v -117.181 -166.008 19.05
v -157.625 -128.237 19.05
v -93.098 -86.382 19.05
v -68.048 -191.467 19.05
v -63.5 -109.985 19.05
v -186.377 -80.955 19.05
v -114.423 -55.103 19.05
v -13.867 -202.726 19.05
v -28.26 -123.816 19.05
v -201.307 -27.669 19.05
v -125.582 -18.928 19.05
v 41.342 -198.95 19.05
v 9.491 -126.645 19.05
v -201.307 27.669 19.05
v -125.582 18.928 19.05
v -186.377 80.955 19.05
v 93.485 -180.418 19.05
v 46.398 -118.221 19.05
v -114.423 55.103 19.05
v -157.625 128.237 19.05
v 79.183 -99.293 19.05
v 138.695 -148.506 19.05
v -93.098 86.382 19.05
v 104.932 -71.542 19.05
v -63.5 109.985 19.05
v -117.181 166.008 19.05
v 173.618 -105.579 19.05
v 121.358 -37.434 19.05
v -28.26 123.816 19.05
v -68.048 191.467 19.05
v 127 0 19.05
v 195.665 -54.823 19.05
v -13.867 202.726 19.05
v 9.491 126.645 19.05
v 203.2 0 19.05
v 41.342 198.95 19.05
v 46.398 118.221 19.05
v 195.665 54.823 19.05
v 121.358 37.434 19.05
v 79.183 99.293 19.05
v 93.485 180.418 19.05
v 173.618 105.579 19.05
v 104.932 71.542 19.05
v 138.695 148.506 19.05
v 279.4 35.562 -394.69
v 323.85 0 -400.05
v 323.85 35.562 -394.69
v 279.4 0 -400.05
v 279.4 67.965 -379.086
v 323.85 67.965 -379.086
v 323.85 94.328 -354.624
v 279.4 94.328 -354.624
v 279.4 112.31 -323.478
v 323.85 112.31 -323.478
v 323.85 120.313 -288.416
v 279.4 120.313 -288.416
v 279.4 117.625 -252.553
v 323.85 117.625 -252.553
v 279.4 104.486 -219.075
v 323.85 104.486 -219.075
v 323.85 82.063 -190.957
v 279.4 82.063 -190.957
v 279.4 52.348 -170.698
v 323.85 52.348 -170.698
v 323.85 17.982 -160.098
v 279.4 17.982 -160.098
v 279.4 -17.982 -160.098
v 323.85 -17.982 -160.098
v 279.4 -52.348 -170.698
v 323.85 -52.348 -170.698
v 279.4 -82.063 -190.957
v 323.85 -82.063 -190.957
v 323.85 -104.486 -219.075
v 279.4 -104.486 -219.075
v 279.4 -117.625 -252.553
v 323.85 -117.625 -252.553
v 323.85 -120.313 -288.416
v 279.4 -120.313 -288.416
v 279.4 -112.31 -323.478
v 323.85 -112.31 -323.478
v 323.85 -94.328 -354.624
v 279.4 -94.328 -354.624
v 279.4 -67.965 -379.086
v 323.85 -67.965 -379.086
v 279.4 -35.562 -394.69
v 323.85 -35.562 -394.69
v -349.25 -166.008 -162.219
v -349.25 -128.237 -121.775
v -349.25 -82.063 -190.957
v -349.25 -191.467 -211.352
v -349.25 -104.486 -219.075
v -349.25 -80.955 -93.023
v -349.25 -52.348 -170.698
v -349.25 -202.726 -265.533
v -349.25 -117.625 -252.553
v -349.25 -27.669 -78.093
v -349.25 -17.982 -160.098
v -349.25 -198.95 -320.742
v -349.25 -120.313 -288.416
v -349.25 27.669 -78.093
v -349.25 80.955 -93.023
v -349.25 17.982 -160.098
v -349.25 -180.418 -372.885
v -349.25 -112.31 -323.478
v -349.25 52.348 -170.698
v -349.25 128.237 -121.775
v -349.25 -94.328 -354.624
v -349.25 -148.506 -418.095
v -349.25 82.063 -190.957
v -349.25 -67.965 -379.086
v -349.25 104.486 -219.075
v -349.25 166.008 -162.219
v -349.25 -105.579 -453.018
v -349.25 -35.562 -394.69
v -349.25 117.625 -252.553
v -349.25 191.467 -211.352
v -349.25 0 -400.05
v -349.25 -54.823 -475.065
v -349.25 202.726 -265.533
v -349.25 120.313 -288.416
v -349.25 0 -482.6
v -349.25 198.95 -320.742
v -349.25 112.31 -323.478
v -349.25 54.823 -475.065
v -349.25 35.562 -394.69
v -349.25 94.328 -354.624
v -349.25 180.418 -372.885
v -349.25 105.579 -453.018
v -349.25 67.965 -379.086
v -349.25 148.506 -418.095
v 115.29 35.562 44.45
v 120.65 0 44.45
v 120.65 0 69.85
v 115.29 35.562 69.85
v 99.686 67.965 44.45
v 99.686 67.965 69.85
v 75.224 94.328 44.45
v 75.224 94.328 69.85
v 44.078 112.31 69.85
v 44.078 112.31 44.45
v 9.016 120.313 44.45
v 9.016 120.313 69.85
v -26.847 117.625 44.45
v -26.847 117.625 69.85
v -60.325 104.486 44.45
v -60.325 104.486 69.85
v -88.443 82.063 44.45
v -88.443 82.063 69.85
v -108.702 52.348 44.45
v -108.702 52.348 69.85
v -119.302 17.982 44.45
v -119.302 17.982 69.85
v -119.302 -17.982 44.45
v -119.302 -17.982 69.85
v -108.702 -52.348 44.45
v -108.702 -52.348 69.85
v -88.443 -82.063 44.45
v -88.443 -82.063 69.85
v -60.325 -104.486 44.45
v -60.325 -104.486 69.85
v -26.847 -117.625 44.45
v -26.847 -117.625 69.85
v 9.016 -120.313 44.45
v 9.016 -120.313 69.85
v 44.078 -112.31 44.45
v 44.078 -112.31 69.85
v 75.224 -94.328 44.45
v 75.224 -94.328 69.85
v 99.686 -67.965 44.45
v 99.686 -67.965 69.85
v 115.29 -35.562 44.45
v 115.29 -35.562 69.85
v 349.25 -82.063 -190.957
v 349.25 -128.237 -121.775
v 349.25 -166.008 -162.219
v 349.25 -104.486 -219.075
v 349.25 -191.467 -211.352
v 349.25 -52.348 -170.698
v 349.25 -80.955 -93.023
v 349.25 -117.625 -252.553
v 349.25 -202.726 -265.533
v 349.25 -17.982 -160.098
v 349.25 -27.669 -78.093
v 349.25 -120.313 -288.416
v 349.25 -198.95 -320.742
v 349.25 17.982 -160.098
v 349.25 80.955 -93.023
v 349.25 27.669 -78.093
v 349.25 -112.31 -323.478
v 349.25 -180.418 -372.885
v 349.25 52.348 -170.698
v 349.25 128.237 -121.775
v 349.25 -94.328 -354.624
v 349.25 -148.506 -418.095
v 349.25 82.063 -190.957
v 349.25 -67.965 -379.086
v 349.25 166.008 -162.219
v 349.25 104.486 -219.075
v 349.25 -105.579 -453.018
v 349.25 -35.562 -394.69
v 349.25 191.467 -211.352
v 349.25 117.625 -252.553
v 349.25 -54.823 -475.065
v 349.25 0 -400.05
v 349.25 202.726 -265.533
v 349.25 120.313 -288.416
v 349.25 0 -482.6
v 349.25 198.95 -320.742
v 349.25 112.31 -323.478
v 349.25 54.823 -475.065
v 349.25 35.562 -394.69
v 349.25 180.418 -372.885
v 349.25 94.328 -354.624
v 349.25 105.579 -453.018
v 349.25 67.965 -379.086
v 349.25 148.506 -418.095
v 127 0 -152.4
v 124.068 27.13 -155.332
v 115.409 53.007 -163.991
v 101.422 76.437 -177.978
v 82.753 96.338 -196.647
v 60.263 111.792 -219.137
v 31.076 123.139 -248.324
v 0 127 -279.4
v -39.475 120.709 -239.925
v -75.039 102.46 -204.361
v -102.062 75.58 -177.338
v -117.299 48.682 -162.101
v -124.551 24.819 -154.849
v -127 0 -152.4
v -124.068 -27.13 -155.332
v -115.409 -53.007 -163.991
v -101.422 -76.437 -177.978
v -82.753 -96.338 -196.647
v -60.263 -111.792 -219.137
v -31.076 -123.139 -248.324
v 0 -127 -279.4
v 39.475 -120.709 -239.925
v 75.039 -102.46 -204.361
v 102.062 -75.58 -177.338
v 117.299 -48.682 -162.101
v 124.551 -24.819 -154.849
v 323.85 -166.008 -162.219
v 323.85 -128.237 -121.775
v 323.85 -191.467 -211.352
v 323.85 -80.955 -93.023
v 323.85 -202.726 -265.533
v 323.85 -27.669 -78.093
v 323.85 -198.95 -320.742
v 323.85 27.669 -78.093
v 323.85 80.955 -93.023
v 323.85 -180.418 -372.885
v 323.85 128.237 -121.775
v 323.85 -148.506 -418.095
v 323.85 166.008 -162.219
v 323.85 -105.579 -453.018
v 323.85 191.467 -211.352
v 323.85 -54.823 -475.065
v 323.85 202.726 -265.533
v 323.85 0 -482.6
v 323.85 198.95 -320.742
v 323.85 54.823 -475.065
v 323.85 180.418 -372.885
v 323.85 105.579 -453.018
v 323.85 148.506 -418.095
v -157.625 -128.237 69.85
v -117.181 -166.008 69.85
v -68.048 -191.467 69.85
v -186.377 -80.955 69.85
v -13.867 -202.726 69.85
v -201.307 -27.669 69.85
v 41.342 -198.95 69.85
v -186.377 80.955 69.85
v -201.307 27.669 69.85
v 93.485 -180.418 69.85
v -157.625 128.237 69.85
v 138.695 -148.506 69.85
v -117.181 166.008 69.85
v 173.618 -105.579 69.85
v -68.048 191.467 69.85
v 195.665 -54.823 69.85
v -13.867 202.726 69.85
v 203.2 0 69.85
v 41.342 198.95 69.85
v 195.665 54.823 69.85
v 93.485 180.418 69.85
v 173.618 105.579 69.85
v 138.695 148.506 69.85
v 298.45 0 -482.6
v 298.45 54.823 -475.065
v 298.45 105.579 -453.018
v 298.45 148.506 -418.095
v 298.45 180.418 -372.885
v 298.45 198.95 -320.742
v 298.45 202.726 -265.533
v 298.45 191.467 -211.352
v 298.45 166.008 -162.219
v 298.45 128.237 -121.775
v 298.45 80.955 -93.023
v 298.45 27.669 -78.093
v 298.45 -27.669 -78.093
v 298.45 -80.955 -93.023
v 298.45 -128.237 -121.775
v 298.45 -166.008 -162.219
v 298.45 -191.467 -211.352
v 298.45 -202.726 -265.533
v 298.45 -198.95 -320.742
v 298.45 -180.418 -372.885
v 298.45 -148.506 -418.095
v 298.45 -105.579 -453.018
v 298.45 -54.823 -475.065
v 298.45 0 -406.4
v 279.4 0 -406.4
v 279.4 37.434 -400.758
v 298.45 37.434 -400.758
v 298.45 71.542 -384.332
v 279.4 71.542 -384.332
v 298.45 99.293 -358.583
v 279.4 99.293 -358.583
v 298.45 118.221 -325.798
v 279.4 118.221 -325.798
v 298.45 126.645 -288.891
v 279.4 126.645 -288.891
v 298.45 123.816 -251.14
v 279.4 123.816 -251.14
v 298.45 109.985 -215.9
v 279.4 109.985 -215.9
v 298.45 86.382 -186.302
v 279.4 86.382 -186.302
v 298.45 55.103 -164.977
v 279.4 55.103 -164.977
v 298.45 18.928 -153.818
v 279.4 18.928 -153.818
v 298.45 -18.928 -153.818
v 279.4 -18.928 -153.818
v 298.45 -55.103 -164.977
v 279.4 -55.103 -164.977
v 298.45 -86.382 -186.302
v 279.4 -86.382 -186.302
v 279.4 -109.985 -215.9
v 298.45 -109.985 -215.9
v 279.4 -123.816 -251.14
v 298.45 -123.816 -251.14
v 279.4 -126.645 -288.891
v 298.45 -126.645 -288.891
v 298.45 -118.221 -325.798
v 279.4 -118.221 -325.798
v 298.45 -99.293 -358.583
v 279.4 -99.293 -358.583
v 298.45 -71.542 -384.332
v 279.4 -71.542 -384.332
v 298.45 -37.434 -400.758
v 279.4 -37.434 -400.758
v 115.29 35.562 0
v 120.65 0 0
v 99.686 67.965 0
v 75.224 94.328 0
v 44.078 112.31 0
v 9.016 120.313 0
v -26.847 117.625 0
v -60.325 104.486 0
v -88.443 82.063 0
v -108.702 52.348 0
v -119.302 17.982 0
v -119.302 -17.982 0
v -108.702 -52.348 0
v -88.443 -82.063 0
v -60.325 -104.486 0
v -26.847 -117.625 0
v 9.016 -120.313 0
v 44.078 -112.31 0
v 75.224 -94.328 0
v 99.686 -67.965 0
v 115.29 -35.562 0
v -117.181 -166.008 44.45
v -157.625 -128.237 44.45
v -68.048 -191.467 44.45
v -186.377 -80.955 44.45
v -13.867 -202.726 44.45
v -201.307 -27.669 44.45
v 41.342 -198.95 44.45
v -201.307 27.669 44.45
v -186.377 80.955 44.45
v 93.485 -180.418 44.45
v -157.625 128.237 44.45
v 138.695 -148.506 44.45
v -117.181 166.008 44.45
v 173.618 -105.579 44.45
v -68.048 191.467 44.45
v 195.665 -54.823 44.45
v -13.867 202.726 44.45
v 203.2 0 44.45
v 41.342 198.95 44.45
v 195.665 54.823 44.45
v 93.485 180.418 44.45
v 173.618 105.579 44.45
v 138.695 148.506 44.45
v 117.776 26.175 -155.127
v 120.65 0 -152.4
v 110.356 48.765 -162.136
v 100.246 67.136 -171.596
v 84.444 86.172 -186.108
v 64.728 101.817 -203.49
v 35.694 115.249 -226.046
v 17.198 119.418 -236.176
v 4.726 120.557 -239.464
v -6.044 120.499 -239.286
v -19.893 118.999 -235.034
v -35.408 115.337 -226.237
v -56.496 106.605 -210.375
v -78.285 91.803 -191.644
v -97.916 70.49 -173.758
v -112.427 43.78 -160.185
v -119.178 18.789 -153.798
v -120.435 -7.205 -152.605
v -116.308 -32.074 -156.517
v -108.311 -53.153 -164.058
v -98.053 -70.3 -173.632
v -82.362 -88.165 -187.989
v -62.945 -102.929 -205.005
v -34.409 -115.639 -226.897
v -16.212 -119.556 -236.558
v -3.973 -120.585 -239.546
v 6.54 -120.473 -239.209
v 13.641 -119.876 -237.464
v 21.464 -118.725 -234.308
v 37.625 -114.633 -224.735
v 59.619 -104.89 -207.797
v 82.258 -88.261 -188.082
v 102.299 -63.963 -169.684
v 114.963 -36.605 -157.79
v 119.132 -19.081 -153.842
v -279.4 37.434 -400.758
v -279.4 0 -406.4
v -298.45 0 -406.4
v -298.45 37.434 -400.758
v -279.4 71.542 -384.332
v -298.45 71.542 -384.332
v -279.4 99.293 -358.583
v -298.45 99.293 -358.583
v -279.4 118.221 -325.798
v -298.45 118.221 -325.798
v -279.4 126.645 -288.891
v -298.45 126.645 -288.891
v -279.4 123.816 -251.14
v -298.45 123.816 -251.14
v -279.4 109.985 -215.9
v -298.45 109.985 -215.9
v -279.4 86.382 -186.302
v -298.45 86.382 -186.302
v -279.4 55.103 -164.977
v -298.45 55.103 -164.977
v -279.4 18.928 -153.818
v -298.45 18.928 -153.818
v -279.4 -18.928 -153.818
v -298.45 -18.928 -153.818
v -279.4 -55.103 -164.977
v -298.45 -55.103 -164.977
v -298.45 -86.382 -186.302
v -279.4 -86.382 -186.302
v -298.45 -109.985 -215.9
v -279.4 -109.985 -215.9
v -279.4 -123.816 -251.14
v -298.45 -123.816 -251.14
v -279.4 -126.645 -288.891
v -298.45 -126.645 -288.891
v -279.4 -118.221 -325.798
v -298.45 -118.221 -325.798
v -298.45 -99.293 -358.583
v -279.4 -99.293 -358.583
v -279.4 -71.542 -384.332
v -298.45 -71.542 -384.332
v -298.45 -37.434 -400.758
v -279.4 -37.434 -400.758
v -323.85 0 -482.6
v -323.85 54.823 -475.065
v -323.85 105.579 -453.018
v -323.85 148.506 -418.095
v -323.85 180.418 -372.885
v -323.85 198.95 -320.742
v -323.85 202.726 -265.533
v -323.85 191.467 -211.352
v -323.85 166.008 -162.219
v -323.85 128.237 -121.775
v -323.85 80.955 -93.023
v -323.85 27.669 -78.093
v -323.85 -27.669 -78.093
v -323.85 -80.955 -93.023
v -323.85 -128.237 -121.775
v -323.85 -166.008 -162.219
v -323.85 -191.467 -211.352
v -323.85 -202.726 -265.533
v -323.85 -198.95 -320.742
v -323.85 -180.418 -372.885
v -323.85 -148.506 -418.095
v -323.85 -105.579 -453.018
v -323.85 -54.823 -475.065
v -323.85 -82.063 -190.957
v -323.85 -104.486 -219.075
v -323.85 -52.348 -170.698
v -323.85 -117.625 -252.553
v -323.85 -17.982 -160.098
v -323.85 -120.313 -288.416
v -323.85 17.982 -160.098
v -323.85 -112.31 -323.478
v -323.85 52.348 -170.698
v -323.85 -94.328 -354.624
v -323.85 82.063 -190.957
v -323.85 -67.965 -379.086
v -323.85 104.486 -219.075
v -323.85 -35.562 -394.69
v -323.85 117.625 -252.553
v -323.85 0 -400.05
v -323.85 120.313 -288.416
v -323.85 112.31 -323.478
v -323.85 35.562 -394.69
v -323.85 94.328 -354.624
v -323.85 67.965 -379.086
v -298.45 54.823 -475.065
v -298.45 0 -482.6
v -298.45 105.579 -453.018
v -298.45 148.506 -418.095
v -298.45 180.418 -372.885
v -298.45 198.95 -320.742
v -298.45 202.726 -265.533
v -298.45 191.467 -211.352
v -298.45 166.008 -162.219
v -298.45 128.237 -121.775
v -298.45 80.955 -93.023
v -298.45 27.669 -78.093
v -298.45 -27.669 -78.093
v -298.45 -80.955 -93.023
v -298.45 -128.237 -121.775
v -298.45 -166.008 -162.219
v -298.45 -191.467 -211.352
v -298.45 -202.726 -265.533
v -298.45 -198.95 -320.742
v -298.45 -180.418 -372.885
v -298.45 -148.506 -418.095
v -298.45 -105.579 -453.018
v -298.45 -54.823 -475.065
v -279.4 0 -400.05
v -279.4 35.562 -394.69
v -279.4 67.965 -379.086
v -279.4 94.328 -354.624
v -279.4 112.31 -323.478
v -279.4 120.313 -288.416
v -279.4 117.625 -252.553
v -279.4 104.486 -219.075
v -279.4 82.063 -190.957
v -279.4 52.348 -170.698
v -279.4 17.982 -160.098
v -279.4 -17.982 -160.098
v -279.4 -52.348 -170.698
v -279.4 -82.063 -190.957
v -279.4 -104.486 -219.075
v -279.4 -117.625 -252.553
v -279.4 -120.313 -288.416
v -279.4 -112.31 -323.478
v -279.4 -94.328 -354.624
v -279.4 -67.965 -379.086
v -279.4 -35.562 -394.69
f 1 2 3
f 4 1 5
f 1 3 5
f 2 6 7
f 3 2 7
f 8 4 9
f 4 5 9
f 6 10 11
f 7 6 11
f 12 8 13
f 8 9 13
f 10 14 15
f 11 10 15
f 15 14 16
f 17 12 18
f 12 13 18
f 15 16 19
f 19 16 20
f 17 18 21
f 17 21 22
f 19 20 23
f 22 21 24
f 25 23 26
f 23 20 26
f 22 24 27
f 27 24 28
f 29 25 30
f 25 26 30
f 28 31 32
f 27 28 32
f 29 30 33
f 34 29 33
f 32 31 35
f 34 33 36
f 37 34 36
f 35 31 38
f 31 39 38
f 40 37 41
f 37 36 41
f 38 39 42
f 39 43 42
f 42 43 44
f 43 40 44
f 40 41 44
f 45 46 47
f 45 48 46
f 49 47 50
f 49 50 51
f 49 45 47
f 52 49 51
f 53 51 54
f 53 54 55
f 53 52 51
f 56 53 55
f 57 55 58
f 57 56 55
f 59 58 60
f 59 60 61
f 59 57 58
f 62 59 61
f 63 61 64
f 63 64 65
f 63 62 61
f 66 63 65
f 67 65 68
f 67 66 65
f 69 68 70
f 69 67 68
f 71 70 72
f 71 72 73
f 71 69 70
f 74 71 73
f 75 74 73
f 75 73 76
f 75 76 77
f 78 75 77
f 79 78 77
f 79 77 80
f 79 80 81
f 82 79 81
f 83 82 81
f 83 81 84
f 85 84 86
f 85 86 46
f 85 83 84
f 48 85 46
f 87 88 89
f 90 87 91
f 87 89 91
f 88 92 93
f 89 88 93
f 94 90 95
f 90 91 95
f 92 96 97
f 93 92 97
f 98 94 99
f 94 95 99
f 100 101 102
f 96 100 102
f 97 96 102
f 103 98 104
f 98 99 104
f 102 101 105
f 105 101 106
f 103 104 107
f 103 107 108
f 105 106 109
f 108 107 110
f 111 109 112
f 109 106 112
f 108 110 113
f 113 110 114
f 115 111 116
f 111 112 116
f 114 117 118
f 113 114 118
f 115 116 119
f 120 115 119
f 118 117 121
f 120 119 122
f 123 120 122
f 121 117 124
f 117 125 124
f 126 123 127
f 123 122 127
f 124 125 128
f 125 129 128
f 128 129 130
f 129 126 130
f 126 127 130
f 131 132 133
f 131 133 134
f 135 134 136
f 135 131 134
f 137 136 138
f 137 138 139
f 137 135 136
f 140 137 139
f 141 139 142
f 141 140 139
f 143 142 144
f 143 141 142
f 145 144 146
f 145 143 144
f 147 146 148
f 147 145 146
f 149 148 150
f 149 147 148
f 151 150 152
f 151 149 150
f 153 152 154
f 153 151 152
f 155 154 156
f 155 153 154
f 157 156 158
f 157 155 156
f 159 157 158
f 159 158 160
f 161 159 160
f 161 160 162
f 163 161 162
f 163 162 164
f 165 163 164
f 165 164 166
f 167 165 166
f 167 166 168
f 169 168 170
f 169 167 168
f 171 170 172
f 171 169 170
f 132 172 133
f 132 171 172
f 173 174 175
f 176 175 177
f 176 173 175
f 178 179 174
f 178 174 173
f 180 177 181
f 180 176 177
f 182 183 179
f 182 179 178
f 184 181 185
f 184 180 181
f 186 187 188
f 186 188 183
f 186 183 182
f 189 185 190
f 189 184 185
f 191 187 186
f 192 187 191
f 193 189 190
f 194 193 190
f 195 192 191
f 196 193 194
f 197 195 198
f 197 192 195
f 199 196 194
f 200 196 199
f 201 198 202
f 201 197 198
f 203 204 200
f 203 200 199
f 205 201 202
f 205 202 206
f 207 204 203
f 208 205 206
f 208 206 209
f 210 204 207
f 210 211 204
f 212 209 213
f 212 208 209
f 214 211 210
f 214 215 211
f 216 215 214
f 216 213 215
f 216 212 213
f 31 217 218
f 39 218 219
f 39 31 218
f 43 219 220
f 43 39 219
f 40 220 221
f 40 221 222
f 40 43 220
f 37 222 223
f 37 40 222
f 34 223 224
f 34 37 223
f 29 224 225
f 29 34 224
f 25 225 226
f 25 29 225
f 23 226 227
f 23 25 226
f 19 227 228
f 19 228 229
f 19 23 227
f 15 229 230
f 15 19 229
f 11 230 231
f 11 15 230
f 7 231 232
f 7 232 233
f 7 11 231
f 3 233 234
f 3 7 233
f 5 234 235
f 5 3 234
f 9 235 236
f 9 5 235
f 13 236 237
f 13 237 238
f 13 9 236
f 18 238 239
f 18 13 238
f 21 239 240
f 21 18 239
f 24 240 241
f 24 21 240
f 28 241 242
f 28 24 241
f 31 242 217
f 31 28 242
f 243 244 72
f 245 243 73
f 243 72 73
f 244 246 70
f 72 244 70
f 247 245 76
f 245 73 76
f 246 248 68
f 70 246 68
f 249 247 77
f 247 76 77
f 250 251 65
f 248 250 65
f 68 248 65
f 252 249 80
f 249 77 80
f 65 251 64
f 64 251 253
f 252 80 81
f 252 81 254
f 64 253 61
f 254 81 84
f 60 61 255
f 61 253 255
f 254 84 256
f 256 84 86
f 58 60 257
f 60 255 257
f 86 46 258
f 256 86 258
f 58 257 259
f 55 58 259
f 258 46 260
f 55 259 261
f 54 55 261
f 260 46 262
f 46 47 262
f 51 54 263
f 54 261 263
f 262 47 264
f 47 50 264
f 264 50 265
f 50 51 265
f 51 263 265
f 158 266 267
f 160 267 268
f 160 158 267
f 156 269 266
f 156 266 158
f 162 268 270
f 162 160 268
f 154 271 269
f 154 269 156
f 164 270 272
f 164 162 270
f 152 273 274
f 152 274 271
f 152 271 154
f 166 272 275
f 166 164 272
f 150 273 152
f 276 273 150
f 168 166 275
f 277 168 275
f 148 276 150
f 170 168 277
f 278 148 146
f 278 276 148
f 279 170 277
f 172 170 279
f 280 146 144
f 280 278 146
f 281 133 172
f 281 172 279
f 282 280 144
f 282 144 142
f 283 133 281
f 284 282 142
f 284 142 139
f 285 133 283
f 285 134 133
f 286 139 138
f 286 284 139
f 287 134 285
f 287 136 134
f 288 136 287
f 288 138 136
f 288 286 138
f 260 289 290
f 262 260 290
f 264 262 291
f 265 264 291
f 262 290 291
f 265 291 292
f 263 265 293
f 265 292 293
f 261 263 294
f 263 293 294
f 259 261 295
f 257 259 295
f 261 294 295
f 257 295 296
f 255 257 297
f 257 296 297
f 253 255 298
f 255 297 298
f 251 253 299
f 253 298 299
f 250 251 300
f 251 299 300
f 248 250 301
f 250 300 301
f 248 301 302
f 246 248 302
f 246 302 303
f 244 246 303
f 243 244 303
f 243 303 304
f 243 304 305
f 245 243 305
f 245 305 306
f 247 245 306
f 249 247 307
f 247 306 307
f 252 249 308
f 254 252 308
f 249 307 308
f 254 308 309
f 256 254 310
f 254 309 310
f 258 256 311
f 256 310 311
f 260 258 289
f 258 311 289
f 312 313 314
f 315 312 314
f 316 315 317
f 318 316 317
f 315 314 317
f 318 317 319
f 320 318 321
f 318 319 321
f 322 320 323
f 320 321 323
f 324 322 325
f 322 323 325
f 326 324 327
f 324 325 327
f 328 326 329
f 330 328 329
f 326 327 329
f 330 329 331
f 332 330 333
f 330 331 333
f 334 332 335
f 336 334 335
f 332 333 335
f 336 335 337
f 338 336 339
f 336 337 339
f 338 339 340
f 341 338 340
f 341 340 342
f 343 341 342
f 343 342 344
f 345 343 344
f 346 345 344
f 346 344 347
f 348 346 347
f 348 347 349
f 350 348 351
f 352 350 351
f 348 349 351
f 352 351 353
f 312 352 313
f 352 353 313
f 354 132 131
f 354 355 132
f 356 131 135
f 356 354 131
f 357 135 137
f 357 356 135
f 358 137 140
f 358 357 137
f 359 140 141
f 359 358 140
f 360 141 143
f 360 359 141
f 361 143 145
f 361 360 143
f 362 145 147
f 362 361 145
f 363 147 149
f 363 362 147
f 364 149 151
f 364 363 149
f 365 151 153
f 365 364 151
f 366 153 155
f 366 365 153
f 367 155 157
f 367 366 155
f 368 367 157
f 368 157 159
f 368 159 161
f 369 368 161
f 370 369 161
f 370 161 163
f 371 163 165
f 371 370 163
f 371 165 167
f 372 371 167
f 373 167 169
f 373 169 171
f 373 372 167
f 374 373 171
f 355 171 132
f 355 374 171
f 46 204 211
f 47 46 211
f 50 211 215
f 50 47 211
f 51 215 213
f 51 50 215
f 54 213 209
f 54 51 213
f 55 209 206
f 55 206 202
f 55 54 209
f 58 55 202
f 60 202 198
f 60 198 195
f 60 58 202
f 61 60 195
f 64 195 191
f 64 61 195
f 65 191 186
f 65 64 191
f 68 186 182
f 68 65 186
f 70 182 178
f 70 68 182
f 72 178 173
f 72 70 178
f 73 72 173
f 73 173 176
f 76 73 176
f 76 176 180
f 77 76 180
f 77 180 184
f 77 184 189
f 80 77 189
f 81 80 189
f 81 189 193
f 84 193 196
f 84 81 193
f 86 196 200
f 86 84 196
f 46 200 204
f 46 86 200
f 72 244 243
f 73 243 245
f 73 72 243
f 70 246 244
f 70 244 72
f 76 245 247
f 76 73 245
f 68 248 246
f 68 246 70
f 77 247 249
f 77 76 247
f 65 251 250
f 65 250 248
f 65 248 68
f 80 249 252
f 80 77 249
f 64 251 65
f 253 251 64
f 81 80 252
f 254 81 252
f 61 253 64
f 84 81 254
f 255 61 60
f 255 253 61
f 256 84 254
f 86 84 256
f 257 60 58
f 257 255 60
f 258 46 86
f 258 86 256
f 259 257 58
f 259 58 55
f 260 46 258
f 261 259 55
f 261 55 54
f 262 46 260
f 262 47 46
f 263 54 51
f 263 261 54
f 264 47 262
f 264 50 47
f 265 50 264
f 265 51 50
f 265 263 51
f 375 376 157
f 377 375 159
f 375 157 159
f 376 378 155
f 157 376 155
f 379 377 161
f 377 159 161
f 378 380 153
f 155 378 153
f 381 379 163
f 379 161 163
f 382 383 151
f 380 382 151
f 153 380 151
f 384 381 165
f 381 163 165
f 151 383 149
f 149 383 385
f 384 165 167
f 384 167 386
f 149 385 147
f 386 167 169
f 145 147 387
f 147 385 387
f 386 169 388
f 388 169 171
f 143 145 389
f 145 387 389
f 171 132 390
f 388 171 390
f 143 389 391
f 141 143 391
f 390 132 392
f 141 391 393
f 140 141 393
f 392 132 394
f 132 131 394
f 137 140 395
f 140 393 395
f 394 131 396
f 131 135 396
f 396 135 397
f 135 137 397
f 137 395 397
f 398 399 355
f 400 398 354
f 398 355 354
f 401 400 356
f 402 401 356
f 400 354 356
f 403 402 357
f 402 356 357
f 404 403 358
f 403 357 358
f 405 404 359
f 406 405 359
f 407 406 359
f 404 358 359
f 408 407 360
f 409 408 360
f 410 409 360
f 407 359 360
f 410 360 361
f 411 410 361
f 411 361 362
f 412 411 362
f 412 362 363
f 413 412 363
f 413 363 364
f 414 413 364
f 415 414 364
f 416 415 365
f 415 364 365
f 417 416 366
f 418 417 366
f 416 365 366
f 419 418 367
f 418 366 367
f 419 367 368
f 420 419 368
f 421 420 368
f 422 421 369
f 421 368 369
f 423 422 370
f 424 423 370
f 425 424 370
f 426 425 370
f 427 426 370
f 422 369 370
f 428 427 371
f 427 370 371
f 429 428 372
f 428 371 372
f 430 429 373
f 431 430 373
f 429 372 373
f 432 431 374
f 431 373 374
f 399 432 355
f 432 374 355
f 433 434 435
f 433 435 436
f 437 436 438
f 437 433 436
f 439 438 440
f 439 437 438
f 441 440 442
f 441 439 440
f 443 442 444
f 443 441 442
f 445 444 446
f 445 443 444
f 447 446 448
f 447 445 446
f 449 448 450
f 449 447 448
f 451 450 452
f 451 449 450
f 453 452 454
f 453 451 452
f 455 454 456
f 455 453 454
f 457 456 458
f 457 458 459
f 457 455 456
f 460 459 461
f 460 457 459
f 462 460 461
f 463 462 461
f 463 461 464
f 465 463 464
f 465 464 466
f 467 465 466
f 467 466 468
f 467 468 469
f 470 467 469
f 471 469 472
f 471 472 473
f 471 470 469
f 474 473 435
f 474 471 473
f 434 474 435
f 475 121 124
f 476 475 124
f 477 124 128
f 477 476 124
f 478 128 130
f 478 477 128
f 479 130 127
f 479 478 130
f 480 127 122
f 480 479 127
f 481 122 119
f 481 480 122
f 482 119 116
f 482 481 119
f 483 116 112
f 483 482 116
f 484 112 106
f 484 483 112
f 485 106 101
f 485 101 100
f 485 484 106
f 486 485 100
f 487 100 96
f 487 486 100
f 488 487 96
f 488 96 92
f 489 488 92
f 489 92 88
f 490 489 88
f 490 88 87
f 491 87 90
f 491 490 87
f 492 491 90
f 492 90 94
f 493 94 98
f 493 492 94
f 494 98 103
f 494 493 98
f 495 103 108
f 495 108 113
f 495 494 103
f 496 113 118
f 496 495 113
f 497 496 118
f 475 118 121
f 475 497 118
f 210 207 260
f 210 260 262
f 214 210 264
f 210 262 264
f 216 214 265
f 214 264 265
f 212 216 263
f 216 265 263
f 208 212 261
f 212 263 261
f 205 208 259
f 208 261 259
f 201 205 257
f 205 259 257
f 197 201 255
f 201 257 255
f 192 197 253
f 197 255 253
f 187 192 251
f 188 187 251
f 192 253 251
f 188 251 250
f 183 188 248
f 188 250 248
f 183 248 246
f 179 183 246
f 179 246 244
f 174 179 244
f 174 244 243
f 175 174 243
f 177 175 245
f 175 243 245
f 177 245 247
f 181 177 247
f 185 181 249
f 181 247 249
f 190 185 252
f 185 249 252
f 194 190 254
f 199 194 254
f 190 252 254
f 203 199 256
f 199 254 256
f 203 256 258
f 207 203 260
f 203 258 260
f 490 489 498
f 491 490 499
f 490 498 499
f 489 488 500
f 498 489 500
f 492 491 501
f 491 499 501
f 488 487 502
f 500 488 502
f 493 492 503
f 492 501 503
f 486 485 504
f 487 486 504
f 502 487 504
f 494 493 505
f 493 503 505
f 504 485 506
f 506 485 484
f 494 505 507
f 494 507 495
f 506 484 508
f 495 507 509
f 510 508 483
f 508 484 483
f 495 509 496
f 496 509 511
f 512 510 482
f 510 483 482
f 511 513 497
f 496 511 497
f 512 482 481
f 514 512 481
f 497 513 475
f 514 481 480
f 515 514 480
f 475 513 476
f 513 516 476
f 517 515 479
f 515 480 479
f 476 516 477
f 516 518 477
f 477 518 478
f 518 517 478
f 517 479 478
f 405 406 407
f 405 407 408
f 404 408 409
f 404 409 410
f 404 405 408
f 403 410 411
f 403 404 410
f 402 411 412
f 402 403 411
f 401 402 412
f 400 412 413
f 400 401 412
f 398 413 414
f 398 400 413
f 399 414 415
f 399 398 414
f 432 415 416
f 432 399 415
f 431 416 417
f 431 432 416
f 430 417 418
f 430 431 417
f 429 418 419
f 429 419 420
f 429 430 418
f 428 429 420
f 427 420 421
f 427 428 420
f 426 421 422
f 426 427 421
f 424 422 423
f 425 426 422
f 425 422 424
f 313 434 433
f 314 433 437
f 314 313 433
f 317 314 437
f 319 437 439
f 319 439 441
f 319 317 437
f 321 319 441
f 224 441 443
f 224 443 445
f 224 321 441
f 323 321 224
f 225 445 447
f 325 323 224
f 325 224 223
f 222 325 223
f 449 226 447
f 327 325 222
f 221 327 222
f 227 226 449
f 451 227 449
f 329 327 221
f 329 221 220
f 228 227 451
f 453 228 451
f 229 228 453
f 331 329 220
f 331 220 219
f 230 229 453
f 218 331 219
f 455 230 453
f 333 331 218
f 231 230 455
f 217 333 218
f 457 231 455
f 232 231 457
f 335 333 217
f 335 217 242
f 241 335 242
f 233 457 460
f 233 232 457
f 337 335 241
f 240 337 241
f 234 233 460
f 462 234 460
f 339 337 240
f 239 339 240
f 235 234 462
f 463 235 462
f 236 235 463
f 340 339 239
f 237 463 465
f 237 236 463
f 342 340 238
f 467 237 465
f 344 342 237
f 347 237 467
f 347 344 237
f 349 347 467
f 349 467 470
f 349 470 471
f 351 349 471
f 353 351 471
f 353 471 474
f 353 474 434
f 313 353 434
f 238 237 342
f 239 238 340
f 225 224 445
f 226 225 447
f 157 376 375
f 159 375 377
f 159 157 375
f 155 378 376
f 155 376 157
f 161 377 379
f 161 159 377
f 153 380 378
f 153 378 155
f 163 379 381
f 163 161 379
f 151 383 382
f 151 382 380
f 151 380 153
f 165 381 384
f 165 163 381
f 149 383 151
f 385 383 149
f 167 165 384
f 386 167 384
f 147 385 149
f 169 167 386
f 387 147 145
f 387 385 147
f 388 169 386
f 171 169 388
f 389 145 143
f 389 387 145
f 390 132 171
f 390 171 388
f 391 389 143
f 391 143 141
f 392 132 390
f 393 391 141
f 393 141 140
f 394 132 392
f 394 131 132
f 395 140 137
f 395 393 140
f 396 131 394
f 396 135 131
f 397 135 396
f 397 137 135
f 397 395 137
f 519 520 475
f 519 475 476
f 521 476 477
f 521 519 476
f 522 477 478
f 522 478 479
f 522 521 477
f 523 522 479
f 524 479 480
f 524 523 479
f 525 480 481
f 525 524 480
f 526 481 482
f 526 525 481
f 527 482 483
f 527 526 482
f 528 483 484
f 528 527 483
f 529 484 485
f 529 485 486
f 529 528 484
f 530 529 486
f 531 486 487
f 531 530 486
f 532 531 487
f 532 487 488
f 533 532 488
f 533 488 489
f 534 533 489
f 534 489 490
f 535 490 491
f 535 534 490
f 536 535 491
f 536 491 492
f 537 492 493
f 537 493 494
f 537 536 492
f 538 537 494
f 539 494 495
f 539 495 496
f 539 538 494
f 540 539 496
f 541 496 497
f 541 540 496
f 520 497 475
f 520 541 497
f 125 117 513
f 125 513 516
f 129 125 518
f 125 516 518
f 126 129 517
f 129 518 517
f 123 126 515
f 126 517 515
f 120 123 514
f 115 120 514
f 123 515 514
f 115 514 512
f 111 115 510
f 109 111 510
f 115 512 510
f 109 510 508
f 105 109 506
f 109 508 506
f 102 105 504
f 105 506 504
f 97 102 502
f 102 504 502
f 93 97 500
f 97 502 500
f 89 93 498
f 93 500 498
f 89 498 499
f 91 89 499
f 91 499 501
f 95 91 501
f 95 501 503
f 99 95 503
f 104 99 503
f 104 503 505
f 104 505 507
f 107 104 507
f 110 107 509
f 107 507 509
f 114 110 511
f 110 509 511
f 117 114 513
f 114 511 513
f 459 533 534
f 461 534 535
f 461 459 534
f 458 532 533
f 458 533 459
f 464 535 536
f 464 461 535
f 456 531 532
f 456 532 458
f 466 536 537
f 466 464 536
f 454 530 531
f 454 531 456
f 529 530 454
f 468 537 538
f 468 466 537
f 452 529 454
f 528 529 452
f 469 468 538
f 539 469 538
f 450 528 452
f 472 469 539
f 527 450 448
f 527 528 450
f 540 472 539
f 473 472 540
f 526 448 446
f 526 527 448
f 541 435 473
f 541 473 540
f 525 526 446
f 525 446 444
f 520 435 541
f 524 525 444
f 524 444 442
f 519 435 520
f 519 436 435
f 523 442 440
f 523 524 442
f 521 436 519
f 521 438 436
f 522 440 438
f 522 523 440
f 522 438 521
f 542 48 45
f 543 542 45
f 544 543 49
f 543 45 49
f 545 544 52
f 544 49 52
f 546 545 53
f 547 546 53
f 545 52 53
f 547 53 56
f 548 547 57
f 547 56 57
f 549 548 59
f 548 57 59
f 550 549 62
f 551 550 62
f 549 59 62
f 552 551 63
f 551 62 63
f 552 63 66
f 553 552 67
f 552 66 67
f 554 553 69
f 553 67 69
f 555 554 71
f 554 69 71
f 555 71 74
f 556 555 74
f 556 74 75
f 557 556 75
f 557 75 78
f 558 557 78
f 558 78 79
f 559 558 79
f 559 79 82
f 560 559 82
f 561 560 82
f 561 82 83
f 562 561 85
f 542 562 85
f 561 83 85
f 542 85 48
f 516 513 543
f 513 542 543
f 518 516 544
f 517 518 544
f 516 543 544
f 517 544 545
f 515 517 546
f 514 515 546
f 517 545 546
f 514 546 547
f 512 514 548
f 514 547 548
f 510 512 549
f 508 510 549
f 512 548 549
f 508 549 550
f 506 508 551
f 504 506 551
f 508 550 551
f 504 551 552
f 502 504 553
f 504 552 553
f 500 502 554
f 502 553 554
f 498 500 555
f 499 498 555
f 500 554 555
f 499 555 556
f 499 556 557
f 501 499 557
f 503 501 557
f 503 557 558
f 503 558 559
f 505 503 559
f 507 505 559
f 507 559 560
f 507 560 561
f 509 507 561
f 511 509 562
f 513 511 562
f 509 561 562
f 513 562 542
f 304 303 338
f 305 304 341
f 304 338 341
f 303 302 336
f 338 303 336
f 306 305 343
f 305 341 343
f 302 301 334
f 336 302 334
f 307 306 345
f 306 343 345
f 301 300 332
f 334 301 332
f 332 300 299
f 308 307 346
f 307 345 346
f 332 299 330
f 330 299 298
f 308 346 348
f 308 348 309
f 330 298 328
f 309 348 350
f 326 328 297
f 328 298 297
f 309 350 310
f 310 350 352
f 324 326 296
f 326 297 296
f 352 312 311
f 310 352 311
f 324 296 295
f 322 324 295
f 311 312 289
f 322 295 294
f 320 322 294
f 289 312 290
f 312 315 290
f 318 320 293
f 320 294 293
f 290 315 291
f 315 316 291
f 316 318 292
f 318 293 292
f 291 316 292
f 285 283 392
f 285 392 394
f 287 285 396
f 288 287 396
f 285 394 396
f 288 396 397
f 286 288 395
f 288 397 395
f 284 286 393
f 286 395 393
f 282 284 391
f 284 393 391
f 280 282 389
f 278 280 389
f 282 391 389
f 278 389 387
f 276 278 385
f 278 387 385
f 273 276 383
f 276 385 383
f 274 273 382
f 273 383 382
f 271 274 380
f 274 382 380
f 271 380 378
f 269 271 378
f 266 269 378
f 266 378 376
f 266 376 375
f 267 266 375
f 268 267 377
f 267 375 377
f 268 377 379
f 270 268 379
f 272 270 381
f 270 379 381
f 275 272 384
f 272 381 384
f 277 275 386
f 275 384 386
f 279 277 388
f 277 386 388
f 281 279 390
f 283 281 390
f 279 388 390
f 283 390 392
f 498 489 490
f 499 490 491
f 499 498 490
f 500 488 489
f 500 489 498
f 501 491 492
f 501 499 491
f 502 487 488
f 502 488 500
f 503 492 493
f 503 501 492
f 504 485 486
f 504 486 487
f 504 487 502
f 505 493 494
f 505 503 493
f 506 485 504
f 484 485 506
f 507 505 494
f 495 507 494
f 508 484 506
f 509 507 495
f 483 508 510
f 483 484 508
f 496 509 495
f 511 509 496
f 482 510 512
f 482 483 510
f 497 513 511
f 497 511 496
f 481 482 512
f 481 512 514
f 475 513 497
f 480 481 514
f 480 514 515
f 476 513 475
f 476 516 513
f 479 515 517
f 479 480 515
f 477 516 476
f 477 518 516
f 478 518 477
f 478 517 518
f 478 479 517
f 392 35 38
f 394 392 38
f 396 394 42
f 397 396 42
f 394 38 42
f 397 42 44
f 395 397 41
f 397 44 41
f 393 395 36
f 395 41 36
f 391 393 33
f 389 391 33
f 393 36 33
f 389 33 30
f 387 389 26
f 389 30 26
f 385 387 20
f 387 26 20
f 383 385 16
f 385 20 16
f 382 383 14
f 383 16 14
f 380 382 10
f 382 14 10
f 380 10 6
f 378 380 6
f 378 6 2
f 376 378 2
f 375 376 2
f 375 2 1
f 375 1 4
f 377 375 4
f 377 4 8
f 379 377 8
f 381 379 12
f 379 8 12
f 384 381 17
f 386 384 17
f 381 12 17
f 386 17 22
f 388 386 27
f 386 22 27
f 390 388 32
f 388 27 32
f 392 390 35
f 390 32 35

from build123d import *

# Parameters (mm, degrees)
F0_R      = 127
F0_R_2    = 120.65
F1_DEPTH  = 19.05
F2_R      = 203.2
F2_R_2    = 127
F2_R_3    = 120.65
F3_DEPTH  = 25.4
F9_ANGLE  = 90
F11_DEPTH = 558.8
F12_REACH = 841.8112448428
F13_DEPTH = 25.4
F14_DEPTH = 25.4
F15_DEPTH = 25.4


with BuildPart() as f1:
    # F0 (on Top) → F1 (new body)
    with BuildSketch(Plane.XY):
        Circle(F0_R)
        Circle(F0_R_2, mode=Mode.SUBTRACT)
    extrude(amount=F1_DEPTH)

    # F2 (on face) → F3 (join)
    with BuildSketch(Plane.XY.offset(19.05)):
        Circle(F2_R)
        Circle(F2_R_2, mode=Mode.SUBTRACT)
        Circle(F2_R_2)
        Circle(F2_R_3, mode=Mode.SUBTRACT)
    extrude(amount=F3_DEPTH)


with BuildPart() as f7_1:
    # F7: copy of F1
    add(f1.part.moved(Location((279.4, 0, -279.4))))


with BuildPart() as f7_1_1:
    # F9: moved
    add(f7_1.part.rotate(Axis((279.4, 122.1911609173, -279.4), (0, 1, 0)), F9_ANGLE))


with BuildPart() as f10_1:
    # F10: instance of F7_1
    add(f7_1_1.part.mirror(Plane.YZ))


with BuildPart() as f7_1_2:
    add(f7_1_1.part)

    # F11 (add, through all): a face of the model
    f11_faces = [f7_1_2.faces().sort_by_distance(p)[0] for p in [
        (279.4, 0, -155.9921024484),
    ]]

    add(f10_1.part)  # F11 merges F10_1
    extrude(f11_faces, amount=F11_DEPTH)


with BuildPart() as f1_1:
    add(f1.part)

    add(f7_1_2.part)  # F12 merges F7_1
    f12_end = f1_1.faces().sort_by_distance((0, 0, -152.4))[0]
    # F0 (on Top) → F12 (join, up to a face of the model that its end follows)
    with BuildSketch(Plane.XY):
        Circle(F0_R)
        Circle(F0_R_2, mode=Mode.SUBTRACT)
    f12_long = extrude(amount=-F12_REACH, mode=Mode.PRIVATE)
    add(split(f12_long, bisect_by=f12_end, keep=Keep.ALL, mode=Mode.PRIVATE).solids().sort_by_distance((-123.4078975516, 0, 0))[0])


with BuildPart() as f13:
    # F13 (new): a face of the model
    f13_faces = [f1_1.part.faces().sort_by_distance(p)[0] for p in [
        (323.85, 0, -81.9473639175),
    ]]
    extrude(f13_faces, amount=F13_DEPTH)


with BuildPart() as f14:
    # F14 (new): a face of the model
    f14_faces = [f1_1.part.faces().sort_by_distance(p)[0] for p in [
        (-323.85, 0, -81.9473639175),
    ]]
    extrude(f14_faces, amount=F14_DEPTH)


with BuildPart() as f15:
    # F15 (new): a face of the model
    f15_faces = [f1_1.part.faces().sort_by_distance(p)[0] for p in [
        (-197.4526360825, 0, 44.45),
    ]]
    extrude(f15_faces, amount=F15_DEPTH)


solid = Compound([f1_1.part, f13.part, f14.part, f15.part])
